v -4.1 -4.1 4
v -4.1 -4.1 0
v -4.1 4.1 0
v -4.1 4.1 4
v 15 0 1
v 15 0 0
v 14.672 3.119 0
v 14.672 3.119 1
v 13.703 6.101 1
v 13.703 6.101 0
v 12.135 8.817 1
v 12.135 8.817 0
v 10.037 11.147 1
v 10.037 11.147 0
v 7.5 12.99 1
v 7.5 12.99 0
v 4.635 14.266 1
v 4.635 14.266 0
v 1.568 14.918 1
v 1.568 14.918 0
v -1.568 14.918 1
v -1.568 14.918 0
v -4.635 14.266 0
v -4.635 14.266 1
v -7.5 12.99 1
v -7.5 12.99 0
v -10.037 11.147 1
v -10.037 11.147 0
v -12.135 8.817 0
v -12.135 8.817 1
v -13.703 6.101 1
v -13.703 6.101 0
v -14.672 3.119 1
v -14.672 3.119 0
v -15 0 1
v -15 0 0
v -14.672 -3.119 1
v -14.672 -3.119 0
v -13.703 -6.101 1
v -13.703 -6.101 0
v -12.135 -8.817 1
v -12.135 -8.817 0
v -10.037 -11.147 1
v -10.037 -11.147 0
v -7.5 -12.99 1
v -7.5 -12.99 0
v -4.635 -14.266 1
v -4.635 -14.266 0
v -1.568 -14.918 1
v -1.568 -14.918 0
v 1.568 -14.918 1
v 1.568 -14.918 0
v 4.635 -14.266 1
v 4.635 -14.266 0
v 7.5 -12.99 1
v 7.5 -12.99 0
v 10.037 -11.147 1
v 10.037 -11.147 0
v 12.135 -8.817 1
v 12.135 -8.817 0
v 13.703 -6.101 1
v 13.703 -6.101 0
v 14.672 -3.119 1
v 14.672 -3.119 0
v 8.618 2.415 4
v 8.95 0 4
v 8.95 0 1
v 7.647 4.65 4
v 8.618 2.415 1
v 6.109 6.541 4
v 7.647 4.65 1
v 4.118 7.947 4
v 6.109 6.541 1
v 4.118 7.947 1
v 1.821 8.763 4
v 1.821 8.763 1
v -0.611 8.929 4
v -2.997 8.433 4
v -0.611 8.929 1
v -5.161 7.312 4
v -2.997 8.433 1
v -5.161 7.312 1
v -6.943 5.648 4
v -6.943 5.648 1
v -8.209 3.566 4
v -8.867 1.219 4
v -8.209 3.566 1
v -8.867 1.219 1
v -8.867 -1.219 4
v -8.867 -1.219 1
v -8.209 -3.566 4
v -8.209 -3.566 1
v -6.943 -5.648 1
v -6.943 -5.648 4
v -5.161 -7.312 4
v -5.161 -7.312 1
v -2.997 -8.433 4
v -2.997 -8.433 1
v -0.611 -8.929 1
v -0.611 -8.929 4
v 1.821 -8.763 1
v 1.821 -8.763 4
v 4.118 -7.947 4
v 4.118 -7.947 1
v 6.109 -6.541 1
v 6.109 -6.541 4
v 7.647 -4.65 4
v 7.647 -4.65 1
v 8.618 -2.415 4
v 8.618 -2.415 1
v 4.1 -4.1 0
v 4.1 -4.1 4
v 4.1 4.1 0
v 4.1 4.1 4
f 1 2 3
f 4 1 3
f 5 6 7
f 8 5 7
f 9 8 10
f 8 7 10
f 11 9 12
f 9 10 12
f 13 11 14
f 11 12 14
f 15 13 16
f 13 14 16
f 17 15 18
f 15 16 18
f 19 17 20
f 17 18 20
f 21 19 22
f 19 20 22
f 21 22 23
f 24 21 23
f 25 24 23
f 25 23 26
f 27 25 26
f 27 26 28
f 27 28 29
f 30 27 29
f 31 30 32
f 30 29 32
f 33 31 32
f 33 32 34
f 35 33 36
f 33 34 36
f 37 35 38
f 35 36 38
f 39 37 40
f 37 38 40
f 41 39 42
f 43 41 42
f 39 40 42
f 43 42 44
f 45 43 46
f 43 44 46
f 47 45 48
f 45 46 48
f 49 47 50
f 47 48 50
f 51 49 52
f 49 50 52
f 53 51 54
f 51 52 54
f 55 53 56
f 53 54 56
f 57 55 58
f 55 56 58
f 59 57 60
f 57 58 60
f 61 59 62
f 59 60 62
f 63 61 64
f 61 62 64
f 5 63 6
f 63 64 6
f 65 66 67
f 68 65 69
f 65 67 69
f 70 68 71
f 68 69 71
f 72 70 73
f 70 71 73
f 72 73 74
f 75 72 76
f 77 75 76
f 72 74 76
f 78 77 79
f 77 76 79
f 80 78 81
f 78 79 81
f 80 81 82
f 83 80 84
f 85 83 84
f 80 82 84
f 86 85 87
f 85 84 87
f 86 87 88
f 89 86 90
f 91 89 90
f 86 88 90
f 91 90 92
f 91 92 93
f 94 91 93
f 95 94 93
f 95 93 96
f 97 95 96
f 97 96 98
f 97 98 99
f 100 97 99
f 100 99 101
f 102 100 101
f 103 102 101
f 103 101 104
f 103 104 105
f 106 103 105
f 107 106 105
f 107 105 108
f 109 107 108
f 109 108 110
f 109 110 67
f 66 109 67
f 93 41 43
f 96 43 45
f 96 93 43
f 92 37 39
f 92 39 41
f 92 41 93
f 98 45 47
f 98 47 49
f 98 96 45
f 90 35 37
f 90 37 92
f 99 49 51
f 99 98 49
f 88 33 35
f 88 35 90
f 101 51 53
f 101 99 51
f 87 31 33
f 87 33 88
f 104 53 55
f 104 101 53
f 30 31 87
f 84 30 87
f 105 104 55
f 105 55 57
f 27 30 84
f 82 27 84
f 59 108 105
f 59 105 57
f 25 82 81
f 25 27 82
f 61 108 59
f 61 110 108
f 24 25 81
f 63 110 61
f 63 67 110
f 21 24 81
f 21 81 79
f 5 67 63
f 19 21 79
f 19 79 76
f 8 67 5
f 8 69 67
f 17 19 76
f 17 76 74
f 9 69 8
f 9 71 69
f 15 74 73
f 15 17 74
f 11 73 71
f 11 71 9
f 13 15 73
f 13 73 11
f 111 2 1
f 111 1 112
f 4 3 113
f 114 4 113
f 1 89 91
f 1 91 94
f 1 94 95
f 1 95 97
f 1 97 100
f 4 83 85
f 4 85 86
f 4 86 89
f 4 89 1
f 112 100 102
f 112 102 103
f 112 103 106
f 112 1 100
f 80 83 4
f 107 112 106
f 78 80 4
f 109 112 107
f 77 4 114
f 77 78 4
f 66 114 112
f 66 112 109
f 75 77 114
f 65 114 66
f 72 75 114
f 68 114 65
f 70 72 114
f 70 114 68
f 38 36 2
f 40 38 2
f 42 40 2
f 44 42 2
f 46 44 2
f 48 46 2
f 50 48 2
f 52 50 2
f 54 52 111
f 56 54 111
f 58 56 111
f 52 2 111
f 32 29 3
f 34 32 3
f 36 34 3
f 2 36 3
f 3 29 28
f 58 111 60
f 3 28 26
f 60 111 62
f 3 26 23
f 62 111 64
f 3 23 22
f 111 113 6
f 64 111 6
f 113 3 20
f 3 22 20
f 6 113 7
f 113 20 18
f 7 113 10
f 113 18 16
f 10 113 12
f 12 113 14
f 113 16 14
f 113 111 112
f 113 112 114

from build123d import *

# Parameters (mm, degrees)
SKETCH_R     = 8.95
SKETCH_W     = 8.2
SKETCH_H     = 8.2
PAD_DEPTH    = 4
SKETCH001_R  = 15
SKETCH001_W  = 8.2
SKETCH001_H  = 8.2
PAD001_DEPTH = 1


with BuildPart() as part:
    # Sketch → Pad (new body)
    with BuildSketch(Plane.XY):
        Circle(SKETCH_R)
        Rectangle(SKETCH_W, SKETCH_H, mode=Mode.SUBTRACT)
    extrude(amount=PAD_DEPTH)

    # Sketch001 → Pad001 (join)
    with BuildSketch(Plane.XY):
        Circle(SKETCH001_R)
        Rectangle(SKETCH001_W, SKETCH001_H, mode=Mode.SUBTRACT)
    extrude(amount=PAD001_DEPTH)


solid = part.part
